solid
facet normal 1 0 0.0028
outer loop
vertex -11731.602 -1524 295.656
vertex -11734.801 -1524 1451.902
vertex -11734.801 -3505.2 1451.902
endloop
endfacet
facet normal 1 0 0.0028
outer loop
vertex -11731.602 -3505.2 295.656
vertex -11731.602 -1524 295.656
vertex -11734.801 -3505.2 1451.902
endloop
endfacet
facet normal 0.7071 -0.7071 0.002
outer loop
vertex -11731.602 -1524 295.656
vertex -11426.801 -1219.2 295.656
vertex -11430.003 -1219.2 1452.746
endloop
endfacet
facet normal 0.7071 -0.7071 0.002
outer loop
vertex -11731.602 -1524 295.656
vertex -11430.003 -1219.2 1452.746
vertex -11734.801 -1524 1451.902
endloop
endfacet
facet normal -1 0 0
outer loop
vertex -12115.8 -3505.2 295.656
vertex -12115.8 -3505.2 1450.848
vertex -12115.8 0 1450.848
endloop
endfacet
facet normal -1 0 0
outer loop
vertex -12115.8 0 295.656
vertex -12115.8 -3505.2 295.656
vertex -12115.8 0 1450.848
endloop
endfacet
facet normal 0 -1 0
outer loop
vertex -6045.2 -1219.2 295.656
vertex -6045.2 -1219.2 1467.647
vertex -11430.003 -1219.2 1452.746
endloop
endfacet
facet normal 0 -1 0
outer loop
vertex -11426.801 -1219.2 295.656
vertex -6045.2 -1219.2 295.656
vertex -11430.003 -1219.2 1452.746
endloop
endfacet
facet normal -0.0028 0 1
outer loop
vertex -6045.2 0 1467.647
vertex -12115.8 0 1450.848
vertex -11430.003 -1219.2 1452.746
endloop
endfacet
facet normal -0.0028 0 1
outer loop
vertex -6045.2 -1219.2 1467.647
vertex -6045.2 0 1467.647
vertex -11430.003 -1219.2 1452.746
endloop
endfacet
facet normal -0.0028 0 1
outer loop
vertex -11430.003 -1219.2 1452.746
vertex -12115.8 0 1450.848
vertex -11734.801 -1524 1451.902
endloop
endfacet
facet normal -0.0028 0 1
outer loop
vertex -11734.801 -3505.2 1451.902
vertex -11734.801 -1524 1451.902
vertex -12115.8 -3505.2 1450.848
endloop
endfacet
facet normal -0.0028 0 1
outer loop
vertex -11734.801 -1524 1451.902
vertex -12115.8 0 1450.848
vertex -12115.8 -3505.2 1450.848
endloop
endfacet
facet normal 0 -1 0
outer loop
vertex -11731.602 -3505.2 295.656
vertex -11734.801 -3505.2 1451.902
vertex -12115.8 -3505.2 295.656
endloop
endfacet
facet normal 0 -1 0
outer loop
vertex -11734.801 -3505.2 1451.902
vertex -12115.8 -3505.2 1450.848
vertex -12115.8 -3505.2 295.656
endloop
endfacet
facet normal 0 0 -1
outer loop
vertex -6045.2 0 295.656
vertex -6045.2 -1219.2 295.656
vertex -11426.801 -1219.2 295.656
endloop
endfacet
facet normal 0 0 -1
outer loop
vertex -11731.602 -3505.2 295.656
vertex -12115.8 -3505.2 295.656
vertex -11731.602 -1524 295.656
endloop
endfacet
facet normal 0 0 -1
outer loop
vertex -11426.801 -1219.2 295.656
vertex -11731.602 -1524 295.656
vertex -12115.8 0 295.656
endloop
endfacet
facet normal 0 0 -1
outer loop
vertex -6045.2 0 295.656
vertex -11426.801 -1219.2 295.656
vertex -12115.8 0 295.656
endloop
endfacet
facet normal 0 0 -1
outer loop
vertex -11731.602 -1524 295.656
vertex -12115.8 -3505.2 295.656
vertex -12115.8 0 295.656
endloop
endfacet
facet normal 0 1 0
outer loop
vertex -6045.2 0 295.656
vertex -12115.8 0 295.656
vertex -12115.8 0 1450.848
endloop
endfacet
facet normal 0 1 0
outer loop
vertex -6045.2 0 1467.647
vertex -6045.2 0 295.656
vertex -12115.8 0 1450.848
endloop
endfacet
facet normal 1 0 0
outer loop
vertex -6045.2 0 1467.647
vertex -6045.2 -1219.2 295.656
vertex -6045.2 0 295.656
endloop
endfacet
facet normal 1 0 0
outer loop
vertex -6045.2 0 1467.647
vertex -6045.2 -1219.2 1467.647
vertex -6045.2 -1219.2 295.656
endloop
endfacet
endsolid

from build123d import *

# Parameters (mm, degrees)
F0_W     = 3505.2
F0_H     = 1188.72
F2_W     = 3505.2
F2_H     = 1155.192
F5_DEPTH = 1187.6712120329
F7_W     = 3505.2
F7_H     = 1828.8
F8_DEPTH = 6045.2008985


with BuildPart() as f3:
    # F0 (on Right) → F3 section 0
    with BuildSketch(Plane.YZ):
        with Locations((-1752.6, 890.016)):
            Rectangle(F0_W, F0_H)
    # F2 (on offset) → F3 section 1
    with BuildSketch(Plane.YZ.offset(-12115.8)):
        with Locations((-1752.6, 873.252)):
            Rectangle(F2_W, F2_H)
    loft()

    # F4 (on face) → F5 (cut, through all)
    with BuildSketch(Plane(origin=(-4.1076757135, 0, 1484.3646328471), x_dir=(0.9999961711, 0, 0.002767285), z_dir=(-0.002767285, 0, 0.9999961711))):
        Polygon((-11730.7386994129, -1524), (-11730.7386994129, -3505.2), (-376.8923085584, -3505.2), (-376.8923085584, -1524), (-681.6923085584, -1219.2), (-11425.9386994129, -1219.2), align=None)
    extrude(amount=-F5_DEPTH, mode=Mode.SUBTRACT)

    # F7 (on offset) → F8 (cut, through all)
    with BuildSketch(Plane.YZ.offset(-6045.1998984)):
        with Locations((-1752.6, 914.4)):
            Rectangle(F7_W, F7_H)
    extrude(amount=F8_DEPTH, mode=Mode.SUBTRACT)


solid = f3.part
